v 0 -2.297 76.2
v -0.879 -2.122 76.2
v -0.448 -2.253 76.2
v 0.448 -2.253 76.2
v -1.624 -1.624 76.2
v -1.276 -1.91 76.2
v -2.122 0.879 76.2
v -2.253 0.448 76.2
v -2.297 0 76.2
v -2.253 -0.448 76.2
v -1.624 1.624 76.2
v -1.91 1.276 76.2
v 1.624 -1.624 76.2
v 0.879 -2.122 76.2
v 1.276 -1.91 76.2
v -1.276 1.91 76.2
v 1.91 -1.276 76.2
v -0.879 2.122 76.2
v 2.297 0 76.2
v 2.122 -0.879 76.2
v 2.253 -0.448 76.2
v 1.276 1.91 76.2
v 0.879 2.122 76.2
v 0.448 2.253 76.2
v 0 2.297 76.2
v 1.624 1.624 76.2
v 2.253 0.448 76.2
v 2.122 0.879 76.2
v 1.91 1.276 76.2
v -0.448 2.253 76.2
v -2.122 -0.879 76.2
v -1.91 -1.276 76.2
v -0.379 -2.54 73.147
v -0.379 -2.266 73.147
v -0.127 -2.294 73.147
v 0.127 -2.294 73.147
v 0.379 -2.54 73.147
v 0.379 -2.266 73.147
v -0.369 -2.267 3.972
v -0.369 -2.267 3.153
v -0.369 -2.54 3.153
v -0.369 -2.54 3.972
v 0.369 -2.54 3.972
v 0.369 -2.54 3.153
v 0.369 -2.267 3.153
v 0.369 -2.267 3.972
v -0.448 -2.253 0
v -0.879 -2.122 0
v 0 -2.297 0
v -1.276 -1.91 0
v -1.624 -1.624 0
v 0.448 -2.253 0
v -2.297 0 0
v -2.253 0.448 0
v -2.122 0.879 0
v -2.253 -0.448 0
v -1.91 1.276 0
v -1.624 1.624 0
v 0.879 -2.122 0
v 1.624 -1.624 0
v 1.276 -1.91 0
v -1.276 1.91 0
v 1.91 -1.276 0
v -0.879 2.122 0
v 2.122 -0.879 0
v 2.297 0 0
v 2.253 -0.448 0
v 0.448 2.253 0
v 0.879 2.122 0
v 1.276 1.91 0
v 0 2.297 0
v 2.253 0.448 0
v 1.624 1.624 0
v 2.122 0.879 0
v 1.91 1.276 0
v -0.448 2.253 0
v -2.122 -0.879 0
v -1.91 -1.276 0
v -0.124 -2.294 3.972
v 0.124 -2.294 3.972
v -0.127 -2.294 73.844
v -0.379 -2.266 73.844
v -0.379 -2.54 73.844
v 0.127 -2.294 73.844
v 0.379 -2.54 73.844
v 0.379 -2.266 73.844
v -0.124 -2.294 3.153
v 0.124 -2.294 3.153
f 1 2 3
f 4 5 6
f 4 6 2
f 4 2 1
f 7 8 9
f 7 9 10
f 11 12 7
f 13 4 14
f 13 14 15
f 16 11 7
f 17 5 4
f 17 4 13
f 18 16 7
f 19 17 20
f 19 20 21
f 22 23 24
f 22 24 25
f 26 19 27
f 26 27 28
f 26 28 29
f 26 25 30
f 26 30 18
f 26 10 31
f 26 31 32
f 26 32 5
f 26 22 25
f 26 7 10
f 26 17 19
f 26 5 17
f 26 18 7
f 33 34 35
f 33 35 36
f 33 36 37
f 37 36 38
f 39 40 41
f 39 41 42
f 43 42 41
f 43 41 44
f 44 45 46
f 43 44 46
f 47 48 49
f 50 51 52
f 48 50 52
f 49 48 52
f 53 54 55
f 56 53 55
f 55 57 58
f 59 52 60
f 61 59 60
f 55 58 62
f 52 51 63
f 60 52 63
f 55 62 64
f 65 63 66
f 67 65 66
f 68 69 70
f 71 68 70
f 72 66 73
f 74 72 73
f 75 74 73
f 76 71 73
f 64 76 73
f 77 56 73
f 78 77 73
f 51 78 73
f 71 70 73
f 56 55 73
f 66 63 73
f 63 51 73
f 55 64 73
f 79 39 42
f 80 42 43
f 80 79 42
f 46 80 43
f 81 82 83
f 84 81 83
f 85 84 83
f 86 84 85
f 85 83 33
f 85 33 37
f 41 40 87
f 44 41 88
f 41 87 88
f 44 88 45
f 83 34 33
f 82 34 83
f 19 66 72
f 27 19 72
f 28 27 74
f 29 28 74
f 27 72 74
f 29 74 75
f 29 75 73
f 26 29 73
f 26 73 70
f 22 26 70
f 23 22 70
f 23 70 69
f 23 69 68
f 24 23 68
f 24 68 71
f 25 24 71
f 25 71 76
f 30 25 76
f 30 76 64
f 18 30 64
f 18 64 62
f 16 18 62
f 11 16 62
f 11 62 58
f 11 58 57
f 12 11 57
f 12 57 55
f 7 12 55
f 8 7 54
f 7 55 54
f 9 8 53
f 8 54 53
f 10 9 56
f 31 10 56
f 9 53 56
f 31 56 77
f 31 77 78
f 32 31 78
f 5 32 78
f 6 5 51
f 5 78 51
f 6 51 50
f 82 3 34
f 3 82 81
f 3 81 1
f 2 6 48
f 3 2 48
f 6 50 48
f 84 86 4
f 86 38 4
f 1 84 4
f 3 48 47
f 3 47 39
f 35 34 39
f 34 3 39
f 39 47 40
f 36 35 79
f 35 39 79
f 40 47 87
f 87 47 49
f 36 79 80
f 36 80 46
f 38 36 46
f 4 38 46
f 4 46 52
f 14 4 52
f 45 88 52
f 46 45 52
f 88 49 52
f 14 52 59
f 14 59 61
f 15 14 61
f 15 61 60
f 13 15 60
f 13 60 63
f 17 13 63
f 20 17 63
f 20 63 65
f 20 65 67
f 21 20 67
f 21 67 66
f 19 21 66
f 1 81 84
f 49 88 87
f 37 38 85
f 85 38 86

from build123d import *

# Parameters (mm, degrees)
F0_R     = 2.297315
F1_DEPTH = 76.2
F2_W     = 0.757628
F2_H     = 0.697389
F2_W_2   = 0.738942
F2_H_2   = 0.819422
F3_DEPTH = 2.54


with BuildPart() as f1:
    # F0 (on Top) → F1 (new body)
    with BuildSketch(Plane.XY):
        Circle(F0_R)
    extrude(amount=F1_DEPTH)

    # F2 (on Front) → F3 (join)
    with BuildSketch(Plane.XZ):
        with Locations((0, 73.495656)):
            Rectangle(F2_W, F2_H)
        with Locations((0, 3.56264)):
            Rectangle(F2_W_2, F2_H_2)
    extrude(amount=F3_DEPTH)


solid = f1.part
